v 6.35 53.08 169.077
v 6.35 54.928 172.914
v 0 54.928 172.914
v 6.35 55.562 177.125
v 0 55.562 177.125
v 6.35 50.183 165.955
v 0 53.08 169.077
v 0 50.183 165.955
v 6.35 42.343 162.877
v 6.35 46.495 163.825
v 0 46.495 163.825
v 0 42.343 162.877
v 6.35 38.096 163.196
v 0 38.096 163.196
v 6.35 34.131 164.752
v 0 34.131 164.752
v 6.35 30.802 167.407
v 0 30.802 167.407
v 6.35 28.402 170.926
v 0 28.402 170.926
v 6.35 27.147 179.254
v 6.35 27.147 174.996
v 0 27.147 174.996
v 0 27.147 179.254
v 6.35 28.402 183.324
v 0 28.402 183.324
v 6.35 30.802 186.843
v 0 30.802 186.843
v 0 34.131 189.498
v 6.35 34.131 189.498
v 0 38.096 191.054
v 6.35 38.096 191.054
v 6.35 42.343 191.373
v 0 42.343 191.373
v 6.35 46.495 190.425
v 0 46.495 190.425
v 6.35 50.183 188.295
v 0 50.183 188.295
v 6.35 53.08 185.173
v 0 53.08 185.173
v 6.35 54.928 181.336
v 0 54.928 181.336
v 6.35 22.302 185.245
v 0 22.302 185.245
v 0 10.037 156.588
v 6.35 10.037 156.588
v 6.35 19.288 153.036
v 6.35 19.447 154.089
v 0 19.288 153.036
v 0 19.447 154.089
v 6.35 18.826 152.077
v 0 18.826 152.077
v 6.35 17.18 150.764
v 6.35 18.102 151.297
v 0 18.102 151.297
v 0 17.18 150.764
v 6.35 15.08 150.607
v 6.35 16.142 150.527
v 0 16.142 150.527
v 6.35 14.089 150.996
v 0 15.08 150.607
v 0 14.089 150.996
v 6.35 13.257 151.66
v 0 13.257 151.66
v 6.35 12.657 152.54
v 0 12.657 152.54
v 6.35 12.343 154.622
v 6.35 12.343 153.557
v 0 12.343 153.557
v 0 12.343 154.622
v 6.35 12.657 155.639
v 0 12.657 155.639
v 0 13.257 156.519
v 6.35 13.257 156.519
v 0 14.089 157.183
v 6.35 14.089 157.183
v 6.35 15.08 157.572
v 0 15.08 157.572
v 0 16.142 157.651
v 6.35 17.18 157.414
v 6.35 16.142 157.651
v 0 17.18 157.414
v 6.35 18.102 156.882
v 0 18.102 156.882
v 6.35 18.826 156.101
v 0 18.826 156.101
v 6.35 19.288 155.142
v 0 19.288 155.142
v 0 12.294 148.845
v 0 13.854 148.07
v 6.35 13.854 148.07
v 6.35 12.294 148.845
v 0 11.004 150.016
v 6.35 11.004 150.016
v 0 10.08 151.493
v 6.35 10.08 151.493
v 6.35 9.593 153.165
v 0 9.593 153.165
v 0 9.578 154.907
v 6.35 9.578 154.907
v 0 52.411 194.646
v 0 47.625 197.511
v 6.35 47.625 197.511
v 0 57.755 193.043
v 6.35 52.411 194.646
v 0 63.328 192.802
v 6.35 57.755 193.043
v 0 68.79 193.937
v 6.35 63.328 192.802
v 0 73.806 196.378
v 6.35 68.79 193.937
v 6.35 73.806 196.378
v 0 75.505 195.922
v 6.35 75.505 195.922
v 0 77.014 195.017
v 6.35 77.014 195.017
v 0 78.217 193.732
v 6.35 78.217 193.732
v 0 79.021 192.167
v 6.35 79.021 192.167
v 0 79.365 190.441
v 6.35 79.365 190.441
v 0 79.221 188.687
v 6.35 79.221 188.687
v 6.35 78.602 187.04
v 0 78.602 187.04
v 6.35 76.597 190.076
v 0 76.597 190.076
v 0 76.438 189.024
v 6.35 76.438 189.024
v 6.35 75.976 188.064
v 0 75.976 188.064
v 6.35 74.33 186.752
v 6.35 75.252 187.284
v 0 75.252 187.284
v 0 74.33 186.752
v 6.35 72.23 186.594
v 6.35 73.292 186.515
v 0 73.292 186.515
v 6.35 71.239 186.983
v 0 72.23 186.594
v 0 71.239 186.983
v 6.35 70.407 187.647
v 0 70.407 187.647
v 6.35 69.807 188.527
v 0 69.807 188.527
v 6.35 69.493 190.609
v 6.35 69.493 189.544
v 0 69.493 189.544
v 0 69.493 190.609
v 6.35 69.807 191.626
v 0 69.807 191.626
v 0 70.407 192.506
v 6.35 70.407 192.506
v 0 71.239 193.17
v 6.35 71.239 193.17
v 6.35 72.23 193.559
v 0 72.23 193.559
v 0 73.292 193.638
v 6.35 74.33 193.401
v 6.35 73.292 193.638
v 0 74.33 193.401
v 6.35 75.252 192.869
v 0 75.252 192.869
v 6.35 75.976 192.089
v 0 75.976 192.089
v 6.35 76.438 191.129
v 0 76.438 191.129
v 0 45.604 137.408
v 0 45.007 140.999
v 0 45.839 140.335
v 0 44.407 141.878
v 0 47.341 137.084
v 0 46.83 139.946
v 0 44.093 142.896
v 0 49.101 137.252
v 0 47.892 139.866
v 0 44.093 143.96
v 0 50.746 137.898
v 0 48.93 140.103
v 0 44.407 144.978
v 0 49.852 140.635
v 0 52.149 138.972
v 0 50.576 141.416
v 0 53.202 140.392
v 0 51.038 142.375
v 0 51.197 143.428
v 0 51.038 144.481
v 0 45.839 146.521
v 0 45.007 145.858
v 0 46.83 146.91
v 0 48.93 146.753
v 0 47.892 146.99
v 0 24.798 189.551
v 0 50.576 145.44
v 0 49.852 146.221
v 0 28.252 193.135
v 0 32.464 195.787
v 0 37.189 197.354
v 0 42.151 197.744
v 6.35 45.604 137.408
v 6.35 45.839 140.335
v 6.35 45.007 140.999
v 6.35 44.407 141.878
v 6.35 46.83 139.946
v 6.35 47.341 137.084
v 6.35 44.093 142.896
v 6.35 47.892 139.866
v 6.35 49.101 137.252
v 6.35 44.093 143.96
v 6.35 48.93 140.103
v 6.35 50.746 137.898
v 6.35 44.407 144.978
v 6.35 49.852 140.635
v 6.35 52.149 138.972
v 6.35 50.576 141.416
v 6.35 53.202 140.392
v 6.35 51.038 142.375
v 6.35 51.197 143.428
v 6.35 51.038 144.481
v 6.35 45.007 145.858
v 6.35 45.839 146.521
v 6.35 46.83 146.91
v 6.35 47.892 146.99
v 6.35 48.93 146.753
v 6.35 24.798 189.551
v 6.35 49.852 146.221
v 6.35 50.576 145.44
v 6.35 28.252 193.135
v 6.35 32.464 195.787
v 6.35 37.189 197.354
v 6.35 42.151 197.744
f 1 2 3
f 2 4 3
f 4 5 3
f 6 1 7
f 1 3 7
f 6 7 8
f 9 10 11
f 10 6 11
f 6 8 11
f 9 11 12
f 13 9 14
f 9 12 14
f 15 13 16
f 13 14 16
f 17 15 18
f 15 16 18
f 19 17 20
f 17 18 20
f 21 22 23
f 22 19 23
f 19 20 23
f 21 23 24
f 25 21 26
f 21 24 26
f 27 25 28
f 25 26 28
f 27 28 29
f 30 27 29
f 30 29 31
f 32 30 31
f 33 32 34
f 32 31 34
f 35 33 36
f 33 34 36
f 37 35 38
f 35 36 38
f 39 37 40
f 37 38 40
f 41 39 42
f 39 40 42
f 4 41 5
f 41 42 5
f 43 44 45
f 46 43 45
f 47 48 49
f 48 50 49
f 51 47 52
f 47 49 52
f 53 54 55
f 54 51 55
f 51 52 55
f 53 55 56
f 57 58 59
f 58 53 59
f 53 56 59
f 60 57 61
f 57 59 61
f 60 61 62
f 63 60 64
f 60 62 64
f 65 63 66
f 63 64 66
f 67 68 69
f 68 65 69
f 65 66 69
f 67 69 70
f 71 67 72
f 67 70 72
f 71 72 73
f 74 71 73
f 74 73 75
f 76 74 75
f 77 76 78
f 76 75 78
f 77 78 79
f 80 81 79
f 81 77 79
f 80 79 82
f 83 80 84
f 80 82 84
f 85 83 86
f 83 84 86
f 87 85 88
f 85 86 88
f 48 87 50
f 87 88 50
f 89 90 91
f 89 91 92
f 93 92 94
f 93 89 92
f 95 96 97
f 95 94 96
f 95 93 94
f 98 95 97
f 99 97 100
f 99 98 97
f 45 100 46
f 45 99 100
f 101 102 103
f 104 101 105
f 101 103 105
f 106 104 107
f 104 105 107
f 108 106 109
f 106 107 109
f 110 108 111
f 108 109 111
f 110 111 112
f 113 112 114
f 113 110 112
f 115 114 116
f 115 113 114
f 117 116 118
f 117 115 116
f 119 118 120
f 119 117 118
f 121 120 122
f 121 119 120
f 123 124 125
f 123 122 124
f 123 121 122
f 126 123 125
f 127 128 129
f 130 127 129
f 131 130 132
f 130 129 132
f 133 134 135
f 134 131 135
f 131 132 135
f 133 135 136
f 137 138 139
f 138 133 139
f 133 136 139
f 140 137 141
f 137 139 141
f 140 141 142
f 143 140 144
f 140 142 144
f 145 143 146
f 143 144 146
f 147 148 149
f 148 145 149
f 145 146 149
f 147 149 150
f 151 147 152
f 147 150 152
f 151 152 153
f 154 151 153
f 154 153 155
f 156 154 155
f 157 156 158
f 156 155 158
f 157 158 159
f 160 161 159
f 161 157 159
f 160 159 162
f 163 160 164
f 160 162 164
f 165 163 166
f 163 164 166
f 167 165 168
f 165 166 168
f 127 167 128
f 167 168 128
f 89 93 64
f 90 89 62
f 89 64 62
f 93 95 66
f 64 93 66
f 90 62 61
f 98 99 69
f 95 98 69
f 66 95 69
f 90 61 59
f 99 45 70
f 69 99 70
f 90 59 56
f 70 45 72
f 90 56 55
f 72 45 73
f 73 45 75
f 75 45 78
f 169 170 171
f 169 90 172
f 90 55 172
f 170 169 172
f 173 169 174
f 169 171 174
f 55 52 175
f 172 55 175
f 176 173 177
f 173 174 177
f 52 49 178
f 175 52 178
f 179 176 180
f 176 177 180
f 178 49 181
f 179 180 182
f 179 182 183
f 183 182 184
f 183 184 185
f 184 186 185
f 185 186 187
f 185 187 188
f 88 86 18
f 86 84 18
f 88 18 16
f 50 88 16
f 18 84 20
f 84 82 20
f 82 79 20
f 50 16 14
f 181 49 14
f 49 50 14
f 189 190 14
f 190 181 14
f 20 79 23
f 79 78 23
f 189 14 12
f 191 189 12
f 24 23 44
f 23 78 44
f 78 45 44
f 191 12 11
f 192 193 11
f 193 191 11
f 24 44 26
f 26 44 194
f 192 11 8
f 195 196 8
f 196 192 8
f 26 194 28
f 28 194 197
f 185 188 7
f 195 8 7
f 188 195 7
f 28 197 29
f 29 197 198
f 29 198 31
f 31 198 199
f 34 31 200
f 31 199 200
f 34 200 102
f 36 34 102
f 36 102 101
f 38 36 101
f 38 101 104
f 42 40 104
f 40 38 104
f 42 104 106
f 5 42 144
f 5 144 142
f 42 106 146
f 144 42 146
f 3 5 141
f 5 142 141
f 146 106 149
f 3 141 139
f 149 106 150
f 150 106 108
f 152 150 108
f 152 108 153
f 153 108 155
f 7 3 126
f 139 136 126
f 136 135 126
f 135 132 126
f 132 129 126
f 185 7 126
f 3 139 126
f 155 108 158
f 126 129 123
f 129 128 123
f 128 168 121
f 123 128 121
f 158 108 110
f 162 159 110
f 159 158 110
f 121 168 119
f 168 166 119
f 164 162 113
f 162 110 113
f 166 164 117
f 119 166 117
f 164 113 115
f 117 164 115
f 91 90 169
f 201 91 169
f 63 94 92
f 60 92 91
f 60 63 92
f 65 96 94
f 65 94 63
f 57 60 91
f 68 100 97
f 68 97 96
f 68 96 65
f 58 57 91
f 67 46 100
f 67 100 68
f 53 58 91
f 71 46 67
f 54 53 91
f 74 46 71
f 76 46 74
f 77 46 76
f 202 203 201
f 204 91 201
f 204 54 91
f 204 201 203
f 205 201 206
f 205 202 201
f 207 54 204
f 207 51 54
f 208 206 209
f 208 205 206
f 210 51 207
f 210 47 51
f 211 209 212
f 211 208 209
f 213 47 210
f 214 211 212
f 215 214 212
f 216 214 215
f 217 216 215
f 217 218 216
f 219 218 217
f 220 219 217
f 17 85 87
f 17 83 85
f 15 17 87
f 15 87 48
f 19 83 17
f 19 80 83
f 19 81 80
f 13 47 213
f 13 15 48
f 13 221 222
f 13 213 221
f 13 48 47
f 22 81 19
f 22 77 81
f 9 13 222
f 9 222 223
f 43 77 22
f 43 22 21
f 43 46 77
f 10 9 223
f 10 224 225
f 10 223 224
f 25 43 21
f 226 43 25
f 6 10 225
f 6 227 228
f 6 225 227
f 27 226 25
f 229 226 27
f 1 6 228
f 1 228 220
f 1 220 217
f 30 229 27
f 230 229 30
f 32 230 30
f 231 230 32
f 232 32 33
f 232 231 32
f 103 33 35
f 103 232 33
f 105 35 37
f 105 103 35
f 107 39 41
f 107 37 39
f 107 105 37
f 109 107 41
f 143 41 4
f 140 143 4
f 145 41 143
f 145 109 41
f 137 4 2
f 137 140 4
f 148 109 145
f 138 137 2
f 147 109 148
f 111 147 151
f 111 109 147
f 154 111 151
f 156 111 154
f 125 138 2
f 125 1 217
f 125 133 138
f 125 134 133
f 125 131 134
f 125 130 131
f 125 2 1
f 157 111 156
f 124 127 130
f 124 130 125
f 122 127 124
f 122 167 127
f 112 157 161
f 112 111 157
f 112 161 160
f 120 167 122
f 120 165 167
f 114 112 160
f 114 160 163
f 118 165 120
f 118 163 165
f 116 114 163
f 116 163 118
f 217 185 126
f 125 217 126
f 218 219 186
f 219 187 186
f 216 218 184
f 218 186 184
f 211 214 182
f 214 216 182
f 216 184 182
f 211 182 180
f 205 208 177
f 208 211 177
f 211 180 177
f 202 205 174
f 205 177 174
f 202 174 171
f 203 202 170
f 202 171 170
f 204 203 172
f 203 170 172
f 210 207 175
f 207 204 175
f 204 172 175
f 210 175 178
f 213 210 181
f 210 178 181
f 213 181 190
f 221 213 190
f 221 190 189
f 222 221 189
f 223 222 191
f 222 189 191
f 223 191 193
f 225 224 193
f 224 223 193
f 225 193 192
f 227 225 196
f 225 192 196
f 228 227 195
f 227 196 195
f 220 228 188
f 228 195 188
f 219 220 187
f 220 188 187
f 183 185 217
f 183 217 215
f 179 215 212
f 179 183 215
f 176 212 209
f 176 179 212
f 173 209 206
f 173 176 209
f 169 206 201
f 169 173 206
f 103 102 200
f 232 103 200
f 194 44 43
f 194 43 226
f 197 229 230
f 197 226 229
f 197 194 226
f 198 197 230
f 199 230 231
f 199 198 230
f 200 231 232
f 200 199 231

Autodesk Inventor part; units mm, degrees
ref_plane "YZ Plane" through (0, 0, 0) normal (1, 0, 0) x (0, 1, 0)
ref_plane "XZ Plane" through (0, 0, 0) normal (0, 1, 0) x (-1, 0, 0)
ref_plane "XY Plane" through (0, 0, 0) normal (0, 0, 1) x (1, 0, 0)
sketch "Sketch1" plane through (0, 0, 0) normal (1, 0, 0) x (0, 1, 0)
  line L0 (111.125, 190.5) -> (36.4799, 190.5)
  line L1 (36.4799, 190.5) -> (-11.1661, 102.5705)
  arc A0 (-11.1661, 102.5705) -> (-11.1661, 90.4695) centre (0, 96.52) ccw
  line L2 (-11.1661, 90.4695) -> (7.6076, 55.8231)
  arc A1 (-11.1661, 6.0505) -> (-11.1661, -6.0505) centre (0, 0) ccw
  line L3 (-11.1661, -6.0505) -> (7.6076, -40.6969)
  arc A2 (-11.1661, -90.4695) -> (-11.1661, -102.5705) centre (0, -96.52) ccw
  line L4 (-11.1661, -102.5705) -> (36.4799, -190.5)
  line L5 (36.4799, -190.5) -> (111.125, -190.5)
  line L6 (111.125, -190.5) -> (111.125, 190.5)
  circle A3 centre (64.6139, -120.5964) radius 6.35 construction
  circle A4 centre (42.5128, -176.727) radius 4.7625 construction
  line L7 (111.125, 0) -> (0, 0) construction
  circle A5 centre (0, 96.52) radius 2.4892 construction
  circle A6 centre (0, 0) radius 2.4892 construction
  circle A7 centre (0, -96.52) radius 2.4892 construction
  line L8 (-11.1661, 6.0505) -> (7.6076, 40.6969)
  arc A8 (7.6076, 40.6969) -> (7.6076, 55.8231) centre (-6.35, 48.26) ccw
  line L9 (-11.1661, -90.4695) -> (7.6076, -55.8231)
  arc A9 (7.6076, -55.8231) -> (7.6076, -40.6969) centre (-6.35, -48.26) ccw
  line L10 (-6.35, -48.26) -> (-6.35, 48.26) construction
  line L11 (-6.35, 0) -> (0, 0) construction
  circle A10 centre (0, 96.52) radius 3.175
  circle A11 centre (0, 0) radius 3.175
  circle A12 centre (0, -96.52) radius 3.175
  circle A13 centre (46.0375, 122.682) radius 3.5687 construction
  circle A14 centre (20.6375, 122.682) radius 3.5687 construction
  circle A15 centre (46.0375, 122.682) radius 3.175
  circle A16 centre (20.6375, 122.682) radius 3.175
  circle A17 centre (100.0125, -94.6341) radius 3.175
  circle A18 centre (74.6125, -94.6341) radius 3.175
  line L12 (0, 96.52) -> (-12.7, 96.52) construction
  circle A19 centre (60.325, -101.6) radius 3.5687 construction
  circle A20 centre (80.899, -155.6385) radius 12.0396 construction
  line L13 (30.099, -178.7242) -> (30.099, -155.6385)
  arc A21 (111.125, -114.8092) -> (30.099, -155.6385) centre (80.899, -155.6385) ccw
  circle A22 centre (60.325, -101.6) radius 3.175
  circle A23 centre (41.275, 177.125) radius 20.6375
  circle A24 centre (41.275, 177.125) radius 26.9875
  circle A25 centre (41.275, 177.125) radius 25.4 construction
  circle A26 centre (85.725, 107.3629) radius 7.9375
  line L14 (-12.7, 190.5) -> (-12.7, -193.5034) construction
  circle A27 centre (85.725, 107.3629) radius 17.78 construction
  circle A28 centre (79.375, 147.5038) radius 22.86 construction
  circle A29 centre (79.375, 147.5038) radius 14.2875
  circle A30 centre (66.675, 254) radius 58.7375 construction
  circle A31 centre (66.675, -254) radius 58.7375 construction
  circle A32 centre (80.899, -155.6385) radius 47.527 construction
  circle A33 centre (100.0125, -94.6341) radius 6.35 construction
  circle A34 centre (74.6125, -94.6341) radius 6.35 construction
  circle A35 centre (17.4625, -131.1466) radius 3.175
  circle A36 centre (17.4625, -131.1466) radius 6.35 construction
  line L15 (9.525, 127) -> (-15.875, 127) construction
  line L16 (-15.875, 127) -> (-15.875, -177.8) construction
  line L17 (-15.875, -177.8) -> (9.525, -177.8) construction
  line L18 (9.525, -177.8) -> (9.525, 127) construction
  circle A37 centre (103.1875, 79.2324) radius 3.175
  circle A38 centre (103.1875, 79.2324) radius 6.35 construction
  circle A39 centre (71.4375, 79.2324) radius 3.175
  circle A40 centre (71.4375, 79.2324) radius 6.35 construction
  line L19 (110.475, 71.2949) -> (60.975, 71.2949) construction
  line L20 (60.975, 71.2949) -> (60.975, -72.4091) construction
  line L21 (60.975, -72.4091) -> (110.475, -72.4091) construction
  line L22 (110.475, -72.4091) -> (110.475, 71.2949) construction
  line L23 (59.675, 71.2949) -> (10.175, 71.2949) construction
  line L24 (10.175, 71.2949) -> (10.175, -72.4091) construction
  line L25 (10.175, -72.4091) -> (59.675, -72.4091) construction
  line L26 (59.675, -72.4091) -> (59.675, 71.2949) construction
  circle A41 centre (99.3625, 31.9249) radius 2.0193
  circle A42 centre (99.3625, 57.3249) radius 2.0193
  circle A43 centre (73.9625, 31.9249) radius 2.0193
  circle A44 centre (73.9625, 57.3249) radius 2.0193
  circle A45 centre (48.5625, -58.4391) radius 2.0193
  circle A46 centre (48.5625, -33.0391) radius 2.0193
  circle A47 centre (23.1625, -58.4391) radius 2.0193
  circle A48 centre (23.1625, -33.0391) radius 2.0193
  line L27 (85.725, 107.3629) -> (85.725, 71.2949) construction
  line L28 (34.925, -72.4091) -> (34.925, -108.4771) construction
  circle A49 centre (-7.9375, -170.18) radius 12 construction
  line L29 (30.099, -178.7242) -> (30.099, -190.5)
  line L30 (30.099, -190.5) -> (5.0625, -190.5)
  line L31 (5.0625, -190.5) -> (5.0625, -132.5199)
  line L32 (36.4799, -190.5) -> (30.099, -190.5)
  circle A50 centre (-7.9375, -170.18) radius 13 construction
  line L33 (111.125, -104.8385) -> (80.899, -104.8385)
  line L34 (111.125, 190.5) -> (46.6374, 203.5744)
  line L35 (-8.7101, 107.103) -> (15.4999, 185.1231)
  circle A51 centre (34.925, -108.4771) radius 17.78 construction
  circle A52 centre (41.275, 177.125) radius 22.225 construction
  circle A53 centre (34.925, -108.4771) radius 7.9375
  circle A54 centre (41.275, 177.125) radius 14.2875
  point P0 (45.9508, 203.7044)
  point P1 (15.9875, 186.5519)
  point P2 (64.715, 190.5)
  point P3 (20.1393, 160.3438)
  dimension "d2" = 15.875
  dimension "d3" = 6.35
  dimension "d4" = 96.52
  dimension "d8" = 6.35
  dimension "d9" = 381
  dimension "d12" = 12.7
  dimension "d14" = 50.8
  dimension "d60" = 41.275
  dimension "d61" = 6.35
  dimension "d62" = 50.8
  dimension "d63" = 15.875
  dimension "d64" = 25.4
  dimension "d66" = 123.825
  dimension "d67" = 35.56
  dimension "d68" = 45.72
  dimension "d69" = 28.575
  dimension "d70" = 31.75
  dimension "d71" = 117.475
  dimension "d72" = 117.475
  dimension "d73" = 95.054
  dimension "d74" = 14.224
  dimension "d75" = 98.3615
  dimension "d76" = 63.5
  dimension "d77" = 44.45
  dimension "d78" = 63.5
  dimension "d79" = 12.7
  dimension "d80" = 12.7
  dimension "d81" = 25.4
  dimension "d82" = 25.4
  dimension "d83" = 304.8
  dimension "d84" = 9.525
  dimension "d89" = 31.75
  dimension "d90" = 12.7
  dimension "d91" = 4.0386
  dimension "d94" = 25.4
  dimension "d97" = 25.4
  dimension "d100" = 4.0386
  dimension "d103" = 25.4
  dimension "d106" = 25.4
  dimension "d109" = 143.704
  dimension "d110" = 143.704
  dimension "d111" = 49.5
  dimension "d112" = 49.5
  dimension "d113" = 13.97
  dimension "d114" = 11.1125
  dimension "d115" = 13.97
  dimension "d116" = 11.1125
  dimension "d117" = 50.038
  dimension "d119" = 7.9375
  dimension "d120" = 7.9375
  dimension "d121" = 11.1125
  dimension "d122" = 22.225
  dimension "d123" = 24
  dimension "d124" = 17.4625
  dimension "d125" = 7.62
  dimension "d127" = 26
  dimension "d128" = 7.9375
  dimension "d164" = 44.45
  dimension "d165" = 69.85
  dimension "d167" = 36.5125
  dimension "d169" = 50.038
  dimension "d170" = 47.1614
  dimension "d171" = 28.575
extrude "Extrusion1" [suppressed]
sketch "Sketch2" plane through (12.7, 0, 0) normal (1, 0, 0) x (0, 0, -1)
  line L0 (-90.4695, -11.1661) -> (-55.8231, 7.6076) construction
  line L1 (-40.6969, 7.6076) -> (-6.0505, -11.1661) construction
  line L2 (6.0505, -11.1661) -> (40.6969, 7.6076) construction
  line L3 (55.8231, 7.6076) -> (90.4695, -11.1661) construction
  line L4 (-107.103, -8.7101) -> (-102.5705, -11.1661) construction
  arc A0 (104.8385, 80.899) -> (155.6385, 30.099) centre (155.6385, 80.899) ccw construction
  line L5 (102.5705, -11.1661) -> (178.7242, 30.099) construction
  circle A1 centre (-190.5, 111.125) radius 3.9688 construction
  circle A2 centre (-146.05, 85.725) radius 7.9375 construction
  circle A3 centre (-146.05, 85.725) radius 3.9688 construction
  circle A4 centre (-152.4, 60.325) radius 3.175 construction
  circle A5 centre (-152.4, 60.325) radius 3.9688 construction
  circle A6 centre (-122.682, 46.0375) radius 3.175 construction
  circle A7 centre (-122.682, 46.0375) radius 3.9688 construction
  circle A8 centre (-122.682, 20.6375) radius 3.175 construction
  circle A9 centre (-122.682, 20.6375) radius 3.9688 construction
  circle A10 centre (-96.52, 0) radius 3.175 construction
  circle A11 centre (-96.52, 0) radius 3.9688 construction
  circle A12 centre (0, 0) radius 3.175 construction
  circle A13 centre (0, 0) radius 3.9688 construction
  circle A14 centre (96.52, 0) radius 3.175 construction
  circle A15 centre (96.52, 0) radius 3.9688 construction
  circle A16 centre (101.6, 60.325) radius 3.175 construction
  circle A17 centre (101.6, 60.325) radius 3.9688 construction
  circle A18 centre (92.075, 34.925) radius 7.9375 construction
  circle A19 centre (92.075, 34.925) radius 3.9688 construction
  circle A20 centre (94.6341, 74.6125) radius 3.175 construction
  circle A21 centre (94.6341, 74.6125) radius 3.9688 construction
  circle A22 centre (94.6341, 100.0125) radius 3.175 construction
  circle A23 centre (94.6341, 100.0125) radius 3.9688 construction
  line L6 (-190.5, 111.125) -> (-146.05, 85.725) construction
  line L7 (-146.05, 85.725) -> (-152.4, 60.325) construction
  line L8 (-152.4, 60.325) -> (-122.682, 46.0375) construction
  line L9 (-152.4, 60.325) -> (-190.5, 111.125) construction
  line L10 (-122.682, 20.6375) -> (-152.4, 60.325) construction
  line L11 (-122.682, 20.6375) -> (-96.52, 0) construction
  line L12 (94.6341, 100.0125) -> (94.6341, 74.6125) construction
  line L13 (94.6341, 74.6125) -> (101.6, 60.325) construction
  line L14 (101.6, 60.325) -> (92.075, 34.925) construction
  line L15 (92.075, 34.925) -> (96.52, 0) construction
  line L16 (96.52, 0) -> (101.6, 60.325) construction
  line L17 (92.075, 34.925) -> (94.6341, 74.6125) construction
  line L18 (101.6, 60.325) -> (94.6341, 100.0125) construction
  line L19 (-122.682, 46.0375) -> (-96.52, 0) construction
  line L20 (104.8385, 111.125) -> (104.8385, 111.125) construction
  line L21 (-146.05, 85.725) -> (-106.0133, 111.125) construction
  circle A24 centre (-122.682, 46.0375) radius 3.175 projected
  line L22 (-146.05, 85.725) -> (-106.0133, 60.325) construction
  line L23 (-106.0133, 60.325) -> (-106.0133, 111.125) construction
  line L24 (92.075, 34.925) -> (77.9653, 57.15) construction
  line L25 (77.9653, 57.15) -> (77.9653, 12.7) construction
  line L26 (77.9653, 12.7) -> (92.075, 34.925) construction
  circle A25 centre (-122.682, 20.6375) radius 3.175 construction
  line L27 (-122.682, 46.0375) -> (-122.682, 20.6375) construction
  line L28 (-122.682, 46.0375) -> (-106.0133, 60.325) construction
  line L29 (0, 0) -> (0, 111.125) construction
  line L30 (104.8385, 111.125) -> (104.8385, 111.125) construction
  line L31 (77.9653, 12.7) -> (0, 0) construction
  line L32 (96.52, 0) -> (77.9653, 12.7) construction
  circle A26 centre (-96.52, 0) radius 3.175 construction
  line L33 (-106.0133, 111.125) -> (-96.52, 0) construction
  circle A27 centre (-106.0133, 111.125) radius 3.9688 construction
  circle A28 centre (0, 111.125) radius 3.9687 construction
  line L34 (0, 0) -> (77.9653, 57.15) construction
  line L35 (77.9653, 57.15) -> (0, 111.125) construction
  line L36 (-190.5, 104.5104) -> (-190.5, -12.7)
  line L37 (-190.5, -12.7) -> (178.7242, -12.7)
  line L38 (178.7242, -12.7) -> (178.7242, 111.125)
  line L39 (178.7242, 111.125) -> (99.6211, 111.125)
  line L40 (-190.5, 111.125) -> (-190.5, 36.4799) projected
  line L41 (-175.5554, 107.1562) -> (-155.9978, 95.9805)
  line L42 (-136.5864, 96.4289) -> (-119.6775, 107.1562)
  line L43 (-119.6775, 107.1562) -> (-175.5554, 107.1562)
  line L44 (-109.982, 103.9071) -> (-109.982, 67.5429)
  line L45 (-109.982, 67.5429) -> (-132.3343, 81.7236)
  line L46 (-132.3343, 89.7264) -> (-109.982, 103.9071)
  line L47 (-152.4, 60.325) -> (-106.0133, 60.325) construction
  line L48 (-154.1502, 69.6878) -> (-153.2291, 73.3721)
  line L49 (-159.9359, 89.0888) -> (-171.5185, 95.7074)
  line L50 (-145.5286, 71.447) -> (-146.4497, 67.7627)
  line L51 (-143.7412, 64.2937) -> (-119.6775, 64.2937)
  line L52 (-119.6775, 64.2937) -> (-136.5864, 75.0211)
  line L53 (-100.5305, 93.5713) -> (-93.4492, 10.6798)
  line L54 (-54.9309, 13.9788) -> (-100.5305, 93.5713)
  line L55 (-99.1656, 107.1562) -> (-48.5749, 18.852)
  line L56 (-48.5749, 18.852) -> (-6.3001, 107.1562)
  line L57 (-6.3001, 107.1562) -> (-99.1656, 107.1562)
  line L58 (-42.0864, 14.0232) -> (-3.9688, 93.644)
  line L59 (-3.9688, 93.644) -> (-3.9688, 10.3796)
  line L60 (12.7052, 107.1562) -> (73.9966, 64.7246)
  line L61 (73.9966, 64.7246) -> (73.9966, 107.1562)
  line L62 (73.9966, 107.1562) -> (12.7052, 107.1562)
  line L63 (81.9341, 43.4938) -> (81.9341, 26.3562)
  line L64 (81.9341, 26.3562) -> (81.3681, 25.4648)
  line L65 (81.3681, 44.3852) -> (81.9341, 43.4938)
  line L66 (15.4626, 6.4136) -> (73.9966, 49.32)
  line L67 (73.9966, 49.32) -> (73.9966, 9.5477)
  line L68 (3.9688, 7.83) -> (3.9688, 103.5504)
  line L69 (3.9688, 103.5504) -> (71.1263, 57.0576)
  line L70 (71.1263, 57.0576) -> (3.9688, 7.83)
  line L71 (94.6341, 74.6125) -> (77.9653, 57.15) construction
  circle A29 centre (77.9653, 57.15) radius 3.9688 construction
  line L72 (82.9801, 56.6557) -> (89.9715, 63.98)
  line L73 (89.9715, 63.98) -> (88.8981, 47.3339)
  line L74 (88.8981, 47.3339) -> (82.9801, 56.6557)
  line L75 (97.6308, 59.41) -> (96.9187, 48.3664)
  line L76 (94.238, 66.3687) -> (97.6308, 59.41)
  line L77 (79.2423, 7.3066) -> (88.0693, 21.2105)
  arc A30 (-136.5864, 96.4289) -> (-155.9978, 95.9805) centre (-146.05, 85.725) ccw
  arc A31 (-132.3343, 81.7236) -> (-132.3343, 89.7264) centre (-146.05, 85.725) ccw
  arc A32 (-145.5286, 71.447) -> (-136.5864, 75.0211) centre (-146.05, 85.725) ccw
  arc A33 (-159.9359, 89.0888) -> (-153.2291, 73.3721) centre (-146.05, 85.725) ccw
  arc A34 (-190.5, 111.125) -> (-188.5663, 106.5622) centre (-184.15, 111.125) ccw
  arc A35 (-161.7077, 58.3023) -> (-154.7102, 51.0844) centre (-152.4, 60.325) ccw
  arc A36 (-132.1679, 21.4994) -> (-118.8104, 11.9348) centre (-122.682, 20.6375) ccw
  arc A37 (-107.3496, 2.4916) -> (-89.4091, -8.5395) centre (-96.52, 0) ccw
  arc A38 (-7.1109, -8.5395) -> (7.1109, -8.5395) centre (0, 0) ccw
  arc A39 (89.4091, -8.5395) -> (105.7359, 6.2092) centre (96.52, 0) ccw
  arc A40 (108.765, 54.049) -> (106.2813, 68.6202) centre (101.6, 60.325) ccw
  arc A41 (101.8605, 93.8073) -> (101.4363, 106.68) centre (94.6341, 100.0125) ccw
  arc A42 (-161.7077, 58.3023) -> (-188.5663, 106.5622) centre (-254.8735, 38.0558) ccw
  arc A43 (-158.047, 67.9956) -> (-171.5185, 95.7074) centre (-254.8735, 38.0558) ccw
  arc A44 (-132.1679, 21.4994) -> (-154.7102, 51.0844) centre (-159.584, 23.9903) ccw
  circle A45 centre (-152.4, 60.325) radius 3.175 projected
  arc A46 (-154.1502, 69.6878) -> (-158.047, 67.9956) centre (-152.4, 60.325) ccw
  arc A47 (-143.7412, 64.2937) -> (-146.4497, 67.7627) centre (-152.4, 60.325) ccw
  arc A48 (-107.3496, 2.4916) -> (-118.8104, 11.9348) centre (-115.4372, 4.3524) ccw
  arc A49 (-7.1109, -8.5395) -> (-89.4091, -8.5395) centre (-48.26, -57.9553) ccw
  arc A50 (89.4091, -8.5395) -> (7.1109, -8.5395) centre (48.26, -57.9553) ccw
  arc A51 (99.6211, 111.125) -> (101.4363, 106.68) centre (105.9711, 111.125) ccw
  arc A52 (101.8605, 93.8073) -> (106.2813, 68.6202) centre (114.4128, 83.029) ccw
  circle A53 centre (-48.26, 10.3187) radius 3.9688 construction
  circle A54 centre (77.9653, 12.7) radius 3.9688 construction
  arc A55 (-54.9309, 13.9788) -> (-86.0187, 3.6345) centre (-48.26, -57.9553) ccw
  arc A56 (-10.5013, 3.6345) -> (-42.0864, 14.0232) centre (-48.26, -57.9553) ccw
  arc A57 (-3.9688, 10.3796) -> (-10.5013, 3.6345) centre (0, 0) ccw
  arc A58 (-6.0505, -11.1661) -> (6.0505, -11.1661) centre (0, 0) ccw projected
  line L78 (0, 111.125) -> (-48.26, 10.3187) construction
  line L79 (-48.26, 10.3187) -> (-106.0133, 111.125) construction
  line L80 (0, 0) -> (-96.52, 0) construction
  line L81 (-48.26, 6.35) -> (-48.26, 0) construction
  arc A59 (-86.0187, 3.6345) -> (-93.4492, 10.6798) centre (-96.52, 0) ccw
  arc A60 (94.3607, 10.9007) -> (86.0187, 3.6345) centre (96.52, 0) ccw
  arc A61 (86.0187, 3.6345) -> (79.2423, 7.3066) centre (48.26, -57.9553) ccw
  arc A62 (73.9966, 9.5477) -> (15.4626, 6.4136) centre (48.26, -57.9553) ccw
  arc A63 (99.4166, 22.668) -> (102.6192, 44.5662) centre (92.075, 34.925) ccw
  arc A64 (95.8015, 48.718) -> (96.9187, 48.3664) centre (92.075, 34.925) ccw
  arc A65 (81.3681, 44.3852) -> (81.3681, 25.4648) centre (92.075, 34.925) ccw
  arc A66 (88.0693, 21.2105) -> (91.6956, 20.6425) centre (92.075, 34.925) ccw
  arc A67 (108.765, 54.049) -> (102.6192, 44.5662) centre (138.319, 28.1619) ccw
  arc A68 (99.4166, 22.668) -> (105.7359, 6.2092) centre (138.319, 28.1619) ccw
  arc A69 (94.238, 66.3687) -> (97.4162, 51.768) centre (101.6, 60.325) ccw
  arc A70 (97.4162, 51.768) -> (95.8015, 48.718) centre (138.319, 28.1619) ccw
  arc A71 (91.6956, 20.6425) -> (94.3607, 10.9007) centre (138.319, 28.1619) ccw
  line L82 (-96.52, 0) -> (-48.26, 10.3187) construction
  line L83 (0, 0) -> (-48.26, 10.3187) construction
  point P0 (69.85, 74.6125)
  point P1 (-173.2979, 46.2664)
  point P2 (114.8092, 111.125)
  point P3 (132.5199, 5.0625)
  point P4 (97.1469, 51.9051)
  point P5 (97.1024, 51.2158)
  dimension "d33" = 7.9375
  dimension "d34" = 44.45
  dimension "d35" = 50.8
  dimension "d37" = 16.6687
  dimension "d38" = 16.6687
  dimension "d39" = 14.2875
  dimension "d40" = 9.525
  dimension "d41" = 11.1125
  dimension "d42" = 6.35
  dimension "d44" = 6.35
  dimension "d46" = 14.2875
  dimension "d47" = 7.9375
extrude "Extrusion2" [suppressed]
delete_face "Delete Face1" [suppressed]
fillet "Fillet2" [suppressed]
fillet "Fillet3" [suppressed]
fillet "Fillet4" [suppressed]
sketch "Sketch3" plane through (0, 111.125, 190.5) normal (0, 1, 0) x (1, 0, 0)
  circle A0 centre (69.85, 18.9559) radius 3.175
  circle A1 centre (69.85, 87.1601) radius 3.175
  circle A2 centre (69.85, 190.5) radius 3.175
  circle A3 centre (69.85, 274.2219) radius 3.175
  line L0 (63.5, 381) -> (63.5, 0)
  line L1 (12.7, 0) -> (12.7, 1.9337) projected
  line L2 (63.5, 0) -> (12.7, 0)
  line L3 (12.7, 0) -> (38.1, 0)
  line L4 (38.1, 22.1309) -> (38.1, 0)
  circle A4 centre (6.35, 18.9559) radius 3.175
  circle A5 centre (6.35, 87.1601) radius 3.175
  circle A6 centre (6.35, 190.5) radius 3.175
  circle A7 centre (6.35, 12.5087) radius 3.175
  line L5 (12.7, 19.3349) -> (12.7, 20.9224) projected
  circle A8 centre (6.35, 248.6025) radius 3.175
  point P0 (0, 190.5)
  point P1 (12.7, 20.1348)
  point P2 (12.7, 20.1287)
  point P3 (12.7, 239.7125)
  dimension "d51" = 6.35
  dimension "d52" = 7.62
  dimension "d53" = 6.35
  dimension "d54" = 8.89
extrude "Extrusion3" [suppressed]
extrude "Extrusion4" [suppressed]
fillet "Fillet5" [suppressed]
fillet "Fillet6" [suppressed]
sketch "Sketch4" plane through (12.7, 0, 0) normal (1, 0, 0) x (0, 0, -1)
  line L0 (177.8, 9.525) -> (-127, 9.525) construction
  line L1 (-127, 9.525) -> (-127, -15.875) construction
  line L2 (-127, -15.875) -> (177.8, -15.875) construction
  line L3 (-190.5, -12.7) -> (193.5034, -12.7) construction
  line L4 (177.8, -15.875) -> (177.8, 9.525) construction
  line L5 (-151.384, 167.5964) -> (215.7494, 167.5964) construction
  line L6 (215.7494, 167.5964) -> (215.7494, 66.675) construction
  line L7 (215.7494, 66.675) -> (-151.384, 66.675) construction
  line L8 (-151.384, 66.675) -> (-151.384, 167.5964) construction
  circle A0 centre (155.6385, 99.949) radius 47.527 construction
  circle A1 centre (92.075, 34.925) radius 7.9375 projected
  circle A2 centre (92.075, 34.925) radius 22.225 construction
  line L9 (-138.684, 66.675) -> (64.516, 66.675) construction
  line L10 (64.516, 66.675) -> (64.516, 15.875) construction
  line L11 (64.516, 15.875) -> (-138.684, 15.875) construction
  line L12 (-138.684, 15.875) -> (-138.684, 66.675) construction
  circle A3 centre (-147.5038, 79.375) radius 14.2875 construction
  circle A4 centre (-177.125, 41.275) radius 20.6375 construction
  circle A5 centre (-107.3629, 85.725) radius 7.9375 construction
  circle A6 centre (-147.5038, 79.375) radius 22.86 construction
  circle A7 centre (-107.3629, 85.725) radius 17.78 construction
  circle A8 centre (-177.125, 41.275) radius 25.4 construction
  circle A9 centre (-75.184, 53.975) radius 3.175
  circle A10 centre (-100.584, 28.575) radius 3.175
  circle A11 centre (-62.484, 28.575) radius 3.175
  circle A12 centre (-37.084, 53.975) radius 3.175
  circle A13 centre (-24.384, 28.575) radius 3.175
  circle A14 centre (1.016, 53.975) radius 3.175
  circle A15 centre (-122.682, 46.0375) radius 3.175 construction
  circle A16 centre (-122.682, 20.6375) radius 3.175 construction
  circle A17 centre (13.716, 28.575) radius 3.175
  point P0 (0, 0)
  point P1 (155.6385, 80.899)
  dimension "d130" = 82.55
  dimension "d131" = 367.1334
  dimension "d132" = 100.9214
  dimension "d133" = 60.1109
  dimension "d134" = 95.054
  dimension "d135" = 33.274
  dimension "d136" = 44.45
  dimension "d137" = 203.2
  dimension "d138" = 12.7
  dimension "d139" = 35.56
  dimension "d140" = 45.72
  dimension "d141" = 50.8
  dimension "d142" = 50.8
  dimension "d143" = 6.35
  dimension "d145" = 38.1
  dimension "d146" = 76.2
  dimension "d147" = 38.1
  dimension "d148" = 76.2
  dimension "d149" = 25.4
  dimension "d150" = 25.4
  dimension "d151" = 12.7
  dimension "d152" = 38.1
  dimension "d153" = 114.3
extrude "Extrusion5" [suppressed]
sketch "Sketch6" plane through (12.7, 0, 0) normal (1, 0, 0) x (0, 0, -1)
  circle A0 centre (-190.0765, 73.025) radius 3.175
  circle A1 centre (-143.4281, 47.625) radius 3.175
  circle A2 centre (-154.0893, 15.875) radius 3.175
  circle A3 centre (-190.0765, 73.025) radius 6.35 construction
  circle A4 centre (-143.4281, 47.625) radius 6.35 construction
  circle A5 centre (-154.0893, 15.875) radius 6.35 construction
  circle A6 centre (-177.125, 41.275) radius 14.2875 construction
  circle A7 centre (-177.125, 41.275) radius 34.29 construction
  line L0 (104.8385, 111.125) -> (-190.5, 111.125) construction
  circle A8 centre (-147.5038, 79.375) radius 14.2875 construction
  circle A9 centre (-147.5038, 79.375) radius 22.86 construction
  circle A10 centre (-177.125, 41.275) radius 25.4 construction
  line L1 (-190.0765, 73.025) -> (-154.0893, 15.875) construction
  line L2 (-154.0893, 15.875) -> (-143.4281, 47.625) construction
  line L3 (-143.4281, 47.625) -> (-190.0765, 73.025) construction
  point P0 (0, 0)
  dimension "d172" = 6.35
  dimension "d173" = 12.7
  dimension "d176" = 63.5
  dimension "d177" = 95.25
  dimension "d180" = 68.58
  dimension "d181" = 45.72
  dimension "d182" = 38.1
extrude "Extrusion6" [suppressed]
sketch "Sketch7" plane through (12.7, 0, 0) normal (1, 0, 0) x (0, 0, -1)
  circle A0 centre (-107.3629, 85.725) radius 7.9375 projected
  circle A1 centre (-107.3629, 85.725) radius 12.6996 construction
  circle A2 centre (-116.3429, 94.705) radius 1
  circle A3 centre (-116.3429, 76.745) radius 1
  circle A4 centre (-98.3829, 76.745) radius 1
  circle A5 centre (-98.3829, 94.705) radius 1
  circle A6 centre (108.4771, 34.925) radius 7.9375 construction
  circle A7 centre (108.4771, 34.925) radius 12.6996 construction
  circle A8 centre (99.4971, 43.905) radius 1
  circle A9 centre (99.4971, 25.945) radius 1
  circle A10 centre (117.4571, 25.945) radius 1
  circle A11 centre (117.4571, 43.905) radius 1
  point P0 (0, 0)
  dimension "d183" = 25.3993
  dimension "d184" = 8.98
  dimension "d185" = 2
  dimension "d188" = 360
  dimension "d190" = 2
  dimension "d191" = 8.98
  dimension "d194" = 360
extrude "Extrusion7" [suppressed]
sketch "Sketch8" plane through (0, 0, 0) normal (1, 0, 0) x (0, 1, 0)
  circle A0 centre (41.275, 177.125) radius 14.2875 projected
  circle A1 centre (73.025, 190.0765) radius 3.175 projected
  circle A2 centre (41.275, 177.125) radius 14.2875 construction
  circle A3 centre (15.875, 154.0893) radius 3.175 projected
  circle A4 centre (41.275, 177.125) radius 34.29 construction
  circle A5 centre (47.625, 143.4281) radius 3.175 projected
  circle A6 centre (73.025, 190.0765) radius 6.35 construction
  circle A7 centre (47.625, 143.4281) radius 6.35 construction
  circle A8 centre (15.875, 154.0893) radius 6.35 construction
  circle A9 centre (41.275, 177.125) radius 20.6375 construction
  line L0 (73.2945, 196.4208) -> (42.151, 197.7439)
  line L1 (22.3021, 185.2451) -> (10.0372, 156.5878)
  line L2 (13.8537, 148.0696) -> (45.6037, 137.4084)
  line L3 (53.2019, 140.3915) -> (78.6019, 187.0399)
  arc A10 (78.6019, 187.0399) -> (73.2945, 196.4208) centre (73.025, 190.0765) ccw
  arc A11 (42.151, 197.7439) -> (22.3021, 185.2451) centre (41.275, 177.125) ccw
  arc A12 (10.0372, 156.5878) -> (13.8537, 148.0696) centre (15.875, 154.0893) ccw
  arc A13 (45.0971, 137.6029) -> (53.2019, 140.3915) centre (47.625, 143.4281) ccw
  circle A14 centre (73.025, 190.0765) radius 3.5719
  circle A15 centre (47.625, 143.4281) radius 3.5719
  circle A16 centre (15.875, 154.0893) radius 3.5719
  point P0 (0, 0)
  dimension "d198" = 3.175
  dimension "d199" = 6.35
  dimension "d202" = 7.1437
  dimension "d203" = 7.1437
  dimension "d204" = 7.1437
extrude "Extrusion8" add sketch "Sketch8" along normal blind 6.35 contours A10 L3 A13 L2 A12 L1 A11 L0
sketch "Sketch9" plane through (6.35, 0, 0) normal (1, 0, 0) x (0, 0, -1)
  arc A0 (-197.5113, 47.625) -> (-196.3978, 73.8357) centre (-215.2693, 61.5084) ccw
  circle A1 centre (-177.125, 41.275) radius 14.2875 projected
  circle A2 centre (-190.0765, 73.025) radius 3.5719 projected
  circle A3 centre (-190.0765, 73.025) radius 5.1594
  circle A4 centre (-177.125, 41.275) radius 20.6375
  line L0 (-196.3978, 73.8357) -> (-197.5113, 47.625)
  line L1 (-196.4208, 73.2945) -> (-197.7439, 42.151) projected
  point P0 (0, 0)
  dimension "d205" = 1.5875
  dimension "d206" = 6.35
  dimension "d213" = 6.35
extrude "Extrusion9" cut sketch "Sketch9" against normal blind 25.4 contours L0 A0
properties part number "OuterDriveRail" material "Aluminum 6061"
